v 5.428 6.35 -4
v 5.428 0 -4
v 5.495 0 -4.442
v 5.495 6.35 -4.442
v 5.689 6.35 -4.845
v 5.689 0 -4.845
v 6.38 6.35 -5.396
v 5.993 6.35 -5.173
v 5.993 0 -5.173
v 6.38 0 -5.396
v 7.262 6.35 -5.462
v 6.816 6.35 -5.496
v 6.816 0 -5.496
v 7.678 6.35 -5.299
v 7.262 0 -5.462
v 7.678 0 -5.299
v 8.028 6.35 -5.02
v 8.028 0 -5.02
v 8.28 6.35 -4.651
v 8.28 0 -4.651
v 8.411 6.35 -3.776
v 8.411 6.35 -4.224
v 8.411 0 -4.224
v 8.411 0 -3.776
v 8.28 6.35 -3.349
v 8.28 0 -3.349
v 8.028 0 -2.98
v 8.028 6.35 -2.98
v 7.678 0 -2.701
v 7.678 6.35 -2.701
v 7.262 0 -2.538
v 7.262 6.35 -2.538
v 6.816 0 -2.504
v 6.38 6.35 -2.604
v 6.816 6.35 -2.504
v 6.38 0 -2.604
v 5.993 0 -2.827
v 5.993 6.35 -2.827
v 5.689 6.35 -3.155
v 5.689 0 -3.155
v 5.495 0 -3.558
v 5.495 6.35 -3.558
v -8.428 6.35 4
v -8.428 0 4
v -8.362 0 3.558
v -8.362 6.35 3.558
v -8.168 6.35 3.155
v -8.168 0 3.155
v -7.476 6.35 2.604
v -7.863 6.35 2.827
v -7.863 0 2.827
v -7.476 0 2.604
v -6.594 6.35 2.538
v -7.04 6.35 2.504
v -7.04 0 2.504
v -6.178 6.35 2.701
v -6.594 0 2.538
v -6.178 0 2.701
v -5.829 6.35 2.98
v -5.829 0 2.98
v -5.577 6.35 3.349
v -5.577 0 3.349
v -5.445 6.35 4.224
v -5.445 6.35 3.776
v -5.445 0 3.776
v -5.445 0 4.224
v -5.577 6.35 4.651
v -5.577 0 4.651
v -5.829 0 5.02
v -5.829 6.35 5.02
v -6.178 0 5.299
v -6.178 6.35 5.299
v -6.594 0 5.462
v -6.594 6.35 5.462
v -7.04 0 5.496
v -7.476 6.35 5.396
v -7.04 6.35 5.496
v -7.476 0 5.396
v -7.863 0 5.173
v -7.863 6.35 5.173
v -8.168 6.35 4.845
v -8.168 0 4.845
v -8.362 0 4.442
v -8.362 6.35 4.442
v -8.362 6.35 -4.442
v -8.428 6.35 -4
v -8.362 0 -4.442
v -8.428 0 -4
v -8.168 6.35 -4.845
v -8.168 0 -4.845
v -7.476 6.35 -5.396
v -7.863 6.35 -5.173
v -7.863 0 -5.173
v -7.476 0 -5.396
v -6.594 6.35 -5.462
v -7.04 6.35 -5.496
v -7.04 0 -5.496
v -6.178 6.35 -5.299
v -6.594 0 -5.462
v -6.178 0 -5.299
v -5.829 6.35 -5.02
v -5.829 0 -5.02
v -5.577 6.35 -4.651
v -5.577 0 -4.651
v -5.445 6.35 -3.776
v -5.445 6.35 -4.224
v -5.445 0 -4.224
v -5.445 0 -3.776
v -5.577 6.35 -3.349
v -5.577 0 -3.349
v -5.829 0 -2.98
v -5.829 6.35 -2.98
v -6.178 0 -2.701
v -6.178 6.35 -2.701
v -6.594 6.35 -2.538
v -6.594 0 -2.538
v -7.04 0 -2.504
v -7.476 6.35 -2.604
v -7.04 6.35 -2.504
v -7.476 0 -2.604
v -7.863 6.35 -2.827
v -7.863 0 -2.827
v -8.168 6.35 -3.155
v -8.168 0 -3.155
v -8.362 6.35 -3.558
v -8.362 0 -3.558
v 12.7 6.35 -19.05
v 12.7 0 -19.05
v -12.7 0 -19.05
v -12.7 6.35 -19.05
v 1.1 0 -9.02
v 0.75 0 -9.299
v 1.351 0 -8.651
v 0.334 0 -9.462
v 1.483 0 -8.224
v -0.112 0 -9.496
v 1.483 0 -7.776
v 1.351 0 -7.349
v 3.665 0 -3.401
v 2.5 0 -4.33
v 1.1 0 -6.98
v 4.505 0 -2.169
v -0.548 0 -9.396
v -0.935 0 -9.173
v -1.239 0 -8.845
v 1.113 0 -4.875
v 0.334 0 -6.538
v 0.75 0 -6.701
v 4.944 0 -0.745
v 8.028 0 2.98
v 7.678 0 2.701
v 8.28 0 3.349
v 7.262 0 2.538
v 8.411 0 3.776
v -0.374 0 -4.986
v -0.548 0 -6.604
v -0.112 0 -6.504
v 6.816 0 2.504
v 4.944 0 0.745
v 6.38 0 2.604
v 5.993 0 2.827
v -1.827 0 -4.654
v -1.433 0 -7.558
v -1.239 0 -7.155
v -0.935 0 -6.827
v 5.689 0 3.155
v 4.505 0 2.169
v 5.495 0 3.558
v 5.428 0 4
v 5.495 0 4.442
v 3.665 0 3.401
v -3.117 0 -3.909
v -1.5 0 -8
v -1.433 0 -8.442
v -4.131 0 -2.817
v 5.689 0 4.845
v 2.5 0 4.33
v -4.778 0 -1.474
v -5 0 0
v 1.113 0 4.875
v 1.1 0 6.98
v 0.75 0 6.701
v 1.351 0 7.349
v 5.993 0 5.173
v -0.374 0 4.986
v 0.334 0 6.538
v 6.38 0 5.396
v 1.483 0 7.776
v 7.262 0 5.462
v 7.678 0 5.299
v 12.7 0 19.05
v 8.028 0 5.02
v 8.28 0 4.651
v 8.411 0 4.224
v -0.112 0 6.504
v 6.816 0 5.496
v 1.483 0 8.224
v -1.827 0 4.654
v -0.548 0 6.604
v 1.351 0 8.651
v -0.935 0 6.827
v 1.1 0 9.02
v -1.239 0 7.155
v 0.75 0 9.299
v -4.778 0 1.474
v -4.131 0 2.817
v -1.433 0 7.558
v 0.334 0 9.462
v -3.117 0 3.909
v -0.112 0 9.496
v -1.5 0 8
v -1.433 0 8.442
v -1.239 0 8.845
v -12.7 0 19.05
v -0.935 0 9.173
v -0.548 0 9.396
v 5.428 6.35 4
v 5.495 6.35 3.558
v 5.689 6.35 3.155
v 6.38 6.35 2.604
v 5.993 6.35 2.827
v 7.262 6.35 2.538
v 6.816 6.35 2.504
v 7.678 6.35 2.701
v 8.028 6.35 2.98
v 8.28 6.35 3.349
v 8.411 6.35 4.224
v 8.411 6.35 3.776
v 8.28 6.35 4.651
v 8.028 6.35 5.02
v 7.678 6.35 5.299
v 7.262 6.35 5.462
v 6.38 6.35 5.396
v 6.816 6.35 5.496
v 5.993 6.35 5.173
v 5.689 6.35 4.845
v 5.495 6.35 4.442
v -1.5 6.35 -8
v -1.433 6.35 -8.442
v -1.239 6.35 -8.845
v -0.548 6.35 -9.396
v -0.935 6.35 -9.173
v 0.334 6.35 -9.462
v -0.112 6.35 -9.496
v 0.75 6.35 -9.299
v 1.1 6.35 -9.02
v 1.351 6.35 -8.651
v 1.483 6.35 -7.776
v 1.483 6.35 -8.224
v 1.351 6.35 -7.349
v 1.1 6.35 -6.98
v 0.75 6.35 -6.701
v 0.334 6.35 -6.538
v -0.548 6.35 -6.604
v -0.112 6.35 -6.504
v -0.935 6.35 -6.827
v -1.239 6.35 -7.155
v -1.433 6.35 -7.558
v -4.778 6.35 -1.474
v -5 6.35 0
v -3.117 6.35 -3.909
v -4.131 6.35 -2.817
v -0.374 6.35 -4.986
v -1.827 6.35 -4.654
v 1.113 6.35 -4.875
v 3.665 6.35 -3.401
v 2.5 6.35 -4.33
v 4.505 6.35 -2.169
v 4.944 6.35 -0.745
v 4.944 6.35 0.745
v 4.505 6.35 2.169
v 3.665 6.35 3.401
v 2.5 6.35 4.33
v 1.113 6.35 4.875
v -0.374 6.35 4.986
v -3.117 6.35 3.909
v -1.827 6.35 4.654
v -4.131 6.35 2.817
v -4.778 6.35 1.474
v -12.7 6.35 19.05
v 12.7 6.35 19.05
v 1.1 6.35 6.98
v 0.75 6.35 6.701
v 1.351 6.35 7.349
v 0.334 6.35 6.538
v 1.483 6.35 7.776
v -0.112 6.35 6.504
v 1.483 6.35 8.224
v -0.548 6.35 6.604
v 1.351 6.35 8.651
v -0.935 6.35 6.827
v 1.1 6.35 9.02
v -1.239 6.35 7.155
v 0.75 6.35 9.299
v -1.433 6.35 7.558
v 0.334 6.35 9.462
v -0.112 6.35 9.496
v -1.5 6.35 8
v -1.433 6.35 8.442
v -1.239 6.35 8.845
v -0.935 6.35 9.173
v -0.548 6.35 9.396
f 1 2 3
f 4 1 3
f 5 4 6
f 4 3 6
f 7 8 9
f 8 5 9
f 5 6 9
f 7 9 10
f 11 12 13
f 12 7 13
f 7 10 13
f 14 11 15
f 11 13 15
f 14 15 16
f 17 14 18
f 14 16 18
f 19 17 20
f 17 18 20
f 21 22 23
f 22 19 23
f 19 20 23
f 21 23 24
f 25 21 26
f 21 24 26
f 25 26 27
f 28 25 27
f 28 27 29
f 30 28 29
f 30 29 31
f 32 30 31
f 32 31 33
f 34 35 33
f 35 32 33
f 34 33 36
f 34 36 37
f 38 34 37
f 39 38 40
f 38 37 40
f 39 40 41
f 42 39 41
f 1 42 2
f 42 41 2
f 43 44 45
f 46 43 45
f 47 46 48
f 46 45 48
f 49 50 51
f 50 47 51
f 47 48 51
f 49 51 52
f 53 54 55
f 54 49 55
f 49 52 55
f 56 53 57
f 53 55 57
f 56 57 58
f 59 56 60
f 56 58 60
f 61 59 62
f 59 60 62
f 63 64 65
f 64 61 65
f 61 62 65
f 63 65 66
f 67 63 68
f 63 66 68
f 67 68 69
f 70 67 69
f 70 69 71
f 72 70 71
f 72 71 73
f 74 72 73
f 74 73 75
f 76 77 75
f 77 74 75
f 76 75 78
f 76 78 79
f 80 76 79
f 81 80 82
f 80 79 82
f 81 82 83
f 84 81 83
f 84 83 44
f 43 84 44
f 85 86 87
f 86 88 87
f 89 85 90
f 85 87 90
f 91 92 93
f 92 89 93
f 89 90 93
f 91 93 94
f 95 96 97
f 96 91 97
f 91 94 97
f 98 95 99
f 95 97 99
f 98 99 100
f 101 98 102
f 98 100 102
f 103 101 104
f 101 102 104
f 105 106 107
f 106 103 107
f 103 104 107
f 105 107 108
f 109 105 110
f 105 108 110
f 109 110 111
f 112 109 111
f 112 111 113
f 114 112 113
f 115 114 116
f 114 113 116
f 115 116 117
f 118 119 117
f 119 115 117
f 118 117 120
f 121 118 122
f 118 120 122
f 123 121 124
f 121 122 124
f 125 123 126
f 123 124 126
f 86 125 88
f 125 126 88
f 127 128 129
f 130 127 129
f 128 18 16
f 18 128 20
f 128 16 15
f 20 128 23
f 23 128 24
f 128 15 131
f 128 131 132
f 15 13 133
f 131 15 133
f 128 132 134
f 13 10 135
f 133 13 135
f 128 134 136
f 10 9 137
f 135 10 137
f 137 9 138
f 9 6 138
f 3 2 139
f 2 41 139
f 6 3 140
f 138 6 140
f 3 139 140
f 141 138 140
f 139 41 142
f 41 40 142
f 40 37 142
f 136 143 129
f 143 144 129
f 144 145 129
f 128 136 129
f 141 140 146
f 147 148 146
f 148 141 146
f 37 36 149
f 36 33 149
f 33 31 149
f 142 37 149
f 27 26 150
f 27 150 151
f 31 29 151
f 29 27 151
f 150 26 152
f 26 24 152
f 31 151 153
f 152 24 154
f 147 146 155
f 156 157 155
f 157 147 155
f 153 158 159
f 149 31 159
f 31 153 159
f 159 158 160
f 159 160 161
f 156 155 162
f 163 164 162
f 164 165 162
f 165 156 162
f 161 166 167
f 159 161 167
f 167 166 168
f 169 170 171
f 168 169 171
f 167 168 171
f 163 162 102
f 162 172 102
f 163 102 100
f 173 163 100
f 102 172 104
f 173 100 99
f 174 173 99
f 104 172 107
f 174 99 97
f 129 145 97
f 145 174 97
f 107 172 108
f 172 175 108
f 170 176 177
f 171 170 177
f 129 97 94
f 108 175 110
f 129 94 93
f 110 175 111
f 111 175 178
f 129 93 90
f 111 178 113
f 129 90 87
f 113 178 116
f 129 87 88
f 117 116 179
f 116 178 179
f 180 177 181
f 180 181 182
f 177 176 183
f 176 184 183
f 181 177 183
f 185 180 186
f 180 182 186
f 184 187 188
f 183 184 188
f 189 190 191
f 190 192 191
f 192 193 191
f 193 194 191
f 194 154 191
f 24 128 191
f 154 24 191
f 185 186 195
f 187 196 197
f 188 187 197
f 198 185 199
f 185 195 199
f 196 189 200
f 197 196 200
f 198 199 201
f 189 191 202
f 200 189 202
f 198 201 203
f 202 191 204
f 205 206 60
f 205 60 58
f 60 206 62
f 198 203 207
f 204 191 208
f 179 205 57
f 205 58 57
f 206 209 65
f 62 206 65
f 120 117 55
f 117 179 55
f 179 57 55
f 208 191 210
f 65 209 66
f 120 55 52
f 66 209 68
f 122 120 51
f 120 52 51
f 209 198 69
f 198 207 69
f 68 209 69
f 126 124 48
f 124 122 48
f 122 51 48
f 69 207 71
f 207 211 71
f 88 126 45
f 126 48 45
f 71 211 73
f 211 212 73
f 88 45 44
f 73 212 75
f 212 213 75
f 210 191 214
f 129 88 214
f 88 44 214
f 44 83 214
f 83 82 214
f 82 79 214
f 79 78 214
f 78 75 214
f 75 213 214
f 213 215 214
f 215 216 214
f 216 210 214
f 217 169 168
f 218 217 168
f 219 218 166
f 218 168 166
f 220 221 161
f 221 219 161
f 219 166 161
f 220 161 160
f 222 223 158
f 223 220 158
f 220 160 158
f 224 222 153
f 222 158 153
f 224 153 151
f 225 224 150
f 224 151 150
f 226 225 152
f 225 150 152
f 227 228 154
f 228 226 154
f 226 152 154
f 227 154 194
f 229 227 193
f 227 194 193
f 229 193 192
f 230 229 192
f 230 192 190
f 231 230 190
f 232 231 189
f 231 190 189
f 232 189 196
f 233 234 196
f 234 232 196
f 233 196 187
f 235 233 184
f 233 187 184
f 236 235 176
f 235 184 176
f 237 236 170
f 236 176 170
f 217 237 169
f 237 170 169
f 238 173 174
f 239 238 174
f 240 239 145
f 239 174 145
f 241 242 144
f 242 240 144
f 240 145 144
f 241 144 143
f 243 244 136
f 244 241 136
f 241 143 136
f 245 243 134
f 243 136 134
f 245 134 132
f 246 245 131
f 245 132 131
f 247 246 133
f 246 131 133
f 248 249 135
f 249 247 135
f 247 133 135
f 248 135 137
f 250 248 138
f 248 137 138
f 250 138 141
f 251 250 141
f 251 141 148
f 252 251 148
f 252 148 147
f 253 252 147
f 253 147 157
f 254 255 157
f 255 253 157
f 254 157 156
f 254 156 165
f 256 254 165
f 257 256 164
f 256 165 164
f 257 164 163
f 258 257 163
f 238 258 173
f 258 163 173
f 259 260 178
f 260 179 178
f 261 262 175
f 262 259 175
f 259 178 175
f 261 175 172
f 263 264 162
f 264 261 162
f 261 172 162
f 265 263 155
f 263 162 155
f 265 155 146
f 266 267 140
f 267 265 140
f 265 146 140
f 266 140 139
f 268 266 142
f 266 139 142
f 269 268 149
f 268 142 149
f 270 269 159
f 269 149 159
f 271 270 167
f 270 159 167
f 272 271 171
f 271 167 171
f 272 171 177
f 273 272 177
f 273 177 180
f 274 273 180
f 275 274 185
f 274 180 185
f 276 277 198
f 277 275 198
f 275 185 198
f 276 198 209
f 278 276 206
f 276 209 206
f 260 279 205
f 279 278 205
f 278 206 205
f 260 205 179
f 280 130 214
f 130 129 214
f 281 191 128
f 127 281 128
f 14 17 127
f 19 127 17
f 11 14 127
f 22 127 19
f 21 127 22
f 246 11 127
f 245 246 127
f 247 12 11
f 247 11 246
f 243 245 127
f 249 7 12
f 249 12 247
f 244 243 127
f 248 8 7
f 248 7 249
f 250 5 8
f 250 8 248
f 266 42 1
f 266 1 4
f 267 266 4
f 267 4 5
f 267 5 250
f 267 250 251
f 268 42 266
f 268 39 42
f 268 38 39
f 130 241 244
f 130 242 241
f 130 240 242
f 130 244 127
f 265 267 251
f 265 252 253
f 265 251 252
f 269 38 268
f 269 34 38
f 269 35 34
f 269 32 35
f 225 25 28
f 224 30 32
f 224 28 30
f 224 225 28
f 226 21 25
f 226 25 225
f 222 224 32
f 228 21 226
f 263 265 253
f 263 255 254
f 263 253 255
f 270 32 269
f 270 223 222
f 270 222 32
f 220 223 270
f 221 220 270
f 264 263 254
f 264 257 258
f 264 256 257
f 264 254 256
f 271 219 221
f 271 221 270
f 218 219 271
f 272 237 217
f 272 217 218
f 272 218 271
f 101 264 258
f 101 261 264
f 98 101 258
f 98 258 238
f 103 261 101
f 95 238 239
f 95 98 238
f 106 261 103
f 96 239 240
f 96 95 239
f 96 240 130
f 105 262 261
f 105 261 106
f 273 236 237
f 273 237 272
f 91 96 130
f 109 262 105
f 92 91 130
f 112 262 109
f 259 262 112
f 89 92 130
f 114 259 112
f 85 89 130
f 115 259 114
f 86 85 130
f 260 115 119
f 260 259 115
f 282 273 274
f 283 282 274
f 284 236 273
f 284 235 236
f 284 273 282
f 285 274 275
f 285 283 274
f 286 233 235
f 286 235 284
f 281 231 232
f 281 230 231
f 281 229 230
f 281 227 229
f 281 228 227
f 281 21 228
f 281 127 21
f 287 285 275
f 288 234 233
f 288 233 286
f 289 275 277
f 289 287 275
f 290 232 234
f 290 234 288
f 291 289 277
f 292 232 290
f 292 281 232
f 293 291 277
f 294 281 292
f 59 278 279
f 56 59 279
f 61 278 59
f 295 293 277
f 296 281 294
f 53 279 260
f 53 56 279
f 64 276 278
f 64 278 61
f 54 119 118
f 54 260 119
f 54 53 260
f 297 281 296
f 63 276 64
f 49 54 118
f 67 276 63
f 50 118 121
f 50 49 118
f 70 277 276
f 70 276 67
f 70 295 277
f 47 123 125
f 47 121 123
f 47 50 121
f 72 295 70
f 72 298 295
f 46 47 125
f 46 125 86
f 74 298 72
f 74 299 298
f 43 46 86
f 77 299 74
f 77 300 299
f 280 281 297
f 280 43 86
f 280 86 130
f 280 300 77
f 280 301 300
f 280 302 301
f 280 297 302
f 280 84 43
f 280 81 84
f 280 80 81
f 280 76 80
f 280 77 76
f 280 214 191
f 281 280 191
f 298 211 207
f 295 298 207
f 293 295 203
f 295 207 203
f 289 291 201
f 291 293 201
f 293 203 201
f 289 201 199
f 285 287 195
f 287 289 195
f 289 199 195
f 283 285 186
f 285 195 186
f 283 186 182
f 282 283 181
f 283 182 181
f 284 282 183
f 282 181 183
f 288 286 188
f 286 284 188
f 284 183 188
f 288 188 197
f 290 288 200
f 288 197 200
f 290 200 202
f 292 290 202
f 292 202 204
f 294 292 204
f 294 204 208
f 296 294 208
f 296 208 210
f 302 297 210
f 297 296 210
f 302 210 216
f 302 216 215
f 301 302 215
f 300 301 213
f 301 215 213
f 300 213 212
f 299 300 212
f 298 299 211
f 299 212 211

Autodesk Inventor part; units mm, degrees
ref_plane "YZ Plane" through (0, 0, 0) normal (1, 0, 0) x (0, 1, 0)
ref_plane "XZ Plane" through (0, 0, 0) normal (0, 1, 0) x (-1, 0, 0)
ref_plane "XY Plane" through (0, 0, 0) normal (0, 0, 1) x (1, 0, 0)
sketch "Sketch1" plane through (0, 0, 0) normal (0, 1, 0) x (-1, 0, 0)
  circle A0 centre (0, 0) radius 8 construction
  circle A1 centre (0, -8) radius 1.5
  circle A2 centre (6.9282, -4) radius 1.5
  circle A3 centre (6.9282, 4) radius 1.5
  circle A4 centre (0, 8) radius 1.5
  circle A5 centre (-6.9282, 4) radius 1.5
  circle A6 centre (-6.9282, -4) radius 1.5
  circle A7 centre (0, 0) radius 5
  line L0 (12.7, 19.05) -> (-12.7, 19.05)
  line L1 (-12.7, 19.05) -> (-12.7, -19.05)
  line L2 (-12.7, -19.05) -> (12.7, -19.05)
  line L3 (12.7, -19.05) -> (12.7, 19.05)
  line L4 (12.7, 19.05) -> (-12.7, -19.05) construction
  line L5 (-12.7, 19.05) -> (12.7, -19.05) construction
  dimension "d0" = 16
  dimension "d1" = 3
  dimension "d4" = 360
  dimension "d6" = 10
  dimension "d7" = 25.4
  dimension "d8" = 38.1
extrude "Extrusion1" add sketch "Sketch1" along normal blind 6.35
properties part number "rev holes"
